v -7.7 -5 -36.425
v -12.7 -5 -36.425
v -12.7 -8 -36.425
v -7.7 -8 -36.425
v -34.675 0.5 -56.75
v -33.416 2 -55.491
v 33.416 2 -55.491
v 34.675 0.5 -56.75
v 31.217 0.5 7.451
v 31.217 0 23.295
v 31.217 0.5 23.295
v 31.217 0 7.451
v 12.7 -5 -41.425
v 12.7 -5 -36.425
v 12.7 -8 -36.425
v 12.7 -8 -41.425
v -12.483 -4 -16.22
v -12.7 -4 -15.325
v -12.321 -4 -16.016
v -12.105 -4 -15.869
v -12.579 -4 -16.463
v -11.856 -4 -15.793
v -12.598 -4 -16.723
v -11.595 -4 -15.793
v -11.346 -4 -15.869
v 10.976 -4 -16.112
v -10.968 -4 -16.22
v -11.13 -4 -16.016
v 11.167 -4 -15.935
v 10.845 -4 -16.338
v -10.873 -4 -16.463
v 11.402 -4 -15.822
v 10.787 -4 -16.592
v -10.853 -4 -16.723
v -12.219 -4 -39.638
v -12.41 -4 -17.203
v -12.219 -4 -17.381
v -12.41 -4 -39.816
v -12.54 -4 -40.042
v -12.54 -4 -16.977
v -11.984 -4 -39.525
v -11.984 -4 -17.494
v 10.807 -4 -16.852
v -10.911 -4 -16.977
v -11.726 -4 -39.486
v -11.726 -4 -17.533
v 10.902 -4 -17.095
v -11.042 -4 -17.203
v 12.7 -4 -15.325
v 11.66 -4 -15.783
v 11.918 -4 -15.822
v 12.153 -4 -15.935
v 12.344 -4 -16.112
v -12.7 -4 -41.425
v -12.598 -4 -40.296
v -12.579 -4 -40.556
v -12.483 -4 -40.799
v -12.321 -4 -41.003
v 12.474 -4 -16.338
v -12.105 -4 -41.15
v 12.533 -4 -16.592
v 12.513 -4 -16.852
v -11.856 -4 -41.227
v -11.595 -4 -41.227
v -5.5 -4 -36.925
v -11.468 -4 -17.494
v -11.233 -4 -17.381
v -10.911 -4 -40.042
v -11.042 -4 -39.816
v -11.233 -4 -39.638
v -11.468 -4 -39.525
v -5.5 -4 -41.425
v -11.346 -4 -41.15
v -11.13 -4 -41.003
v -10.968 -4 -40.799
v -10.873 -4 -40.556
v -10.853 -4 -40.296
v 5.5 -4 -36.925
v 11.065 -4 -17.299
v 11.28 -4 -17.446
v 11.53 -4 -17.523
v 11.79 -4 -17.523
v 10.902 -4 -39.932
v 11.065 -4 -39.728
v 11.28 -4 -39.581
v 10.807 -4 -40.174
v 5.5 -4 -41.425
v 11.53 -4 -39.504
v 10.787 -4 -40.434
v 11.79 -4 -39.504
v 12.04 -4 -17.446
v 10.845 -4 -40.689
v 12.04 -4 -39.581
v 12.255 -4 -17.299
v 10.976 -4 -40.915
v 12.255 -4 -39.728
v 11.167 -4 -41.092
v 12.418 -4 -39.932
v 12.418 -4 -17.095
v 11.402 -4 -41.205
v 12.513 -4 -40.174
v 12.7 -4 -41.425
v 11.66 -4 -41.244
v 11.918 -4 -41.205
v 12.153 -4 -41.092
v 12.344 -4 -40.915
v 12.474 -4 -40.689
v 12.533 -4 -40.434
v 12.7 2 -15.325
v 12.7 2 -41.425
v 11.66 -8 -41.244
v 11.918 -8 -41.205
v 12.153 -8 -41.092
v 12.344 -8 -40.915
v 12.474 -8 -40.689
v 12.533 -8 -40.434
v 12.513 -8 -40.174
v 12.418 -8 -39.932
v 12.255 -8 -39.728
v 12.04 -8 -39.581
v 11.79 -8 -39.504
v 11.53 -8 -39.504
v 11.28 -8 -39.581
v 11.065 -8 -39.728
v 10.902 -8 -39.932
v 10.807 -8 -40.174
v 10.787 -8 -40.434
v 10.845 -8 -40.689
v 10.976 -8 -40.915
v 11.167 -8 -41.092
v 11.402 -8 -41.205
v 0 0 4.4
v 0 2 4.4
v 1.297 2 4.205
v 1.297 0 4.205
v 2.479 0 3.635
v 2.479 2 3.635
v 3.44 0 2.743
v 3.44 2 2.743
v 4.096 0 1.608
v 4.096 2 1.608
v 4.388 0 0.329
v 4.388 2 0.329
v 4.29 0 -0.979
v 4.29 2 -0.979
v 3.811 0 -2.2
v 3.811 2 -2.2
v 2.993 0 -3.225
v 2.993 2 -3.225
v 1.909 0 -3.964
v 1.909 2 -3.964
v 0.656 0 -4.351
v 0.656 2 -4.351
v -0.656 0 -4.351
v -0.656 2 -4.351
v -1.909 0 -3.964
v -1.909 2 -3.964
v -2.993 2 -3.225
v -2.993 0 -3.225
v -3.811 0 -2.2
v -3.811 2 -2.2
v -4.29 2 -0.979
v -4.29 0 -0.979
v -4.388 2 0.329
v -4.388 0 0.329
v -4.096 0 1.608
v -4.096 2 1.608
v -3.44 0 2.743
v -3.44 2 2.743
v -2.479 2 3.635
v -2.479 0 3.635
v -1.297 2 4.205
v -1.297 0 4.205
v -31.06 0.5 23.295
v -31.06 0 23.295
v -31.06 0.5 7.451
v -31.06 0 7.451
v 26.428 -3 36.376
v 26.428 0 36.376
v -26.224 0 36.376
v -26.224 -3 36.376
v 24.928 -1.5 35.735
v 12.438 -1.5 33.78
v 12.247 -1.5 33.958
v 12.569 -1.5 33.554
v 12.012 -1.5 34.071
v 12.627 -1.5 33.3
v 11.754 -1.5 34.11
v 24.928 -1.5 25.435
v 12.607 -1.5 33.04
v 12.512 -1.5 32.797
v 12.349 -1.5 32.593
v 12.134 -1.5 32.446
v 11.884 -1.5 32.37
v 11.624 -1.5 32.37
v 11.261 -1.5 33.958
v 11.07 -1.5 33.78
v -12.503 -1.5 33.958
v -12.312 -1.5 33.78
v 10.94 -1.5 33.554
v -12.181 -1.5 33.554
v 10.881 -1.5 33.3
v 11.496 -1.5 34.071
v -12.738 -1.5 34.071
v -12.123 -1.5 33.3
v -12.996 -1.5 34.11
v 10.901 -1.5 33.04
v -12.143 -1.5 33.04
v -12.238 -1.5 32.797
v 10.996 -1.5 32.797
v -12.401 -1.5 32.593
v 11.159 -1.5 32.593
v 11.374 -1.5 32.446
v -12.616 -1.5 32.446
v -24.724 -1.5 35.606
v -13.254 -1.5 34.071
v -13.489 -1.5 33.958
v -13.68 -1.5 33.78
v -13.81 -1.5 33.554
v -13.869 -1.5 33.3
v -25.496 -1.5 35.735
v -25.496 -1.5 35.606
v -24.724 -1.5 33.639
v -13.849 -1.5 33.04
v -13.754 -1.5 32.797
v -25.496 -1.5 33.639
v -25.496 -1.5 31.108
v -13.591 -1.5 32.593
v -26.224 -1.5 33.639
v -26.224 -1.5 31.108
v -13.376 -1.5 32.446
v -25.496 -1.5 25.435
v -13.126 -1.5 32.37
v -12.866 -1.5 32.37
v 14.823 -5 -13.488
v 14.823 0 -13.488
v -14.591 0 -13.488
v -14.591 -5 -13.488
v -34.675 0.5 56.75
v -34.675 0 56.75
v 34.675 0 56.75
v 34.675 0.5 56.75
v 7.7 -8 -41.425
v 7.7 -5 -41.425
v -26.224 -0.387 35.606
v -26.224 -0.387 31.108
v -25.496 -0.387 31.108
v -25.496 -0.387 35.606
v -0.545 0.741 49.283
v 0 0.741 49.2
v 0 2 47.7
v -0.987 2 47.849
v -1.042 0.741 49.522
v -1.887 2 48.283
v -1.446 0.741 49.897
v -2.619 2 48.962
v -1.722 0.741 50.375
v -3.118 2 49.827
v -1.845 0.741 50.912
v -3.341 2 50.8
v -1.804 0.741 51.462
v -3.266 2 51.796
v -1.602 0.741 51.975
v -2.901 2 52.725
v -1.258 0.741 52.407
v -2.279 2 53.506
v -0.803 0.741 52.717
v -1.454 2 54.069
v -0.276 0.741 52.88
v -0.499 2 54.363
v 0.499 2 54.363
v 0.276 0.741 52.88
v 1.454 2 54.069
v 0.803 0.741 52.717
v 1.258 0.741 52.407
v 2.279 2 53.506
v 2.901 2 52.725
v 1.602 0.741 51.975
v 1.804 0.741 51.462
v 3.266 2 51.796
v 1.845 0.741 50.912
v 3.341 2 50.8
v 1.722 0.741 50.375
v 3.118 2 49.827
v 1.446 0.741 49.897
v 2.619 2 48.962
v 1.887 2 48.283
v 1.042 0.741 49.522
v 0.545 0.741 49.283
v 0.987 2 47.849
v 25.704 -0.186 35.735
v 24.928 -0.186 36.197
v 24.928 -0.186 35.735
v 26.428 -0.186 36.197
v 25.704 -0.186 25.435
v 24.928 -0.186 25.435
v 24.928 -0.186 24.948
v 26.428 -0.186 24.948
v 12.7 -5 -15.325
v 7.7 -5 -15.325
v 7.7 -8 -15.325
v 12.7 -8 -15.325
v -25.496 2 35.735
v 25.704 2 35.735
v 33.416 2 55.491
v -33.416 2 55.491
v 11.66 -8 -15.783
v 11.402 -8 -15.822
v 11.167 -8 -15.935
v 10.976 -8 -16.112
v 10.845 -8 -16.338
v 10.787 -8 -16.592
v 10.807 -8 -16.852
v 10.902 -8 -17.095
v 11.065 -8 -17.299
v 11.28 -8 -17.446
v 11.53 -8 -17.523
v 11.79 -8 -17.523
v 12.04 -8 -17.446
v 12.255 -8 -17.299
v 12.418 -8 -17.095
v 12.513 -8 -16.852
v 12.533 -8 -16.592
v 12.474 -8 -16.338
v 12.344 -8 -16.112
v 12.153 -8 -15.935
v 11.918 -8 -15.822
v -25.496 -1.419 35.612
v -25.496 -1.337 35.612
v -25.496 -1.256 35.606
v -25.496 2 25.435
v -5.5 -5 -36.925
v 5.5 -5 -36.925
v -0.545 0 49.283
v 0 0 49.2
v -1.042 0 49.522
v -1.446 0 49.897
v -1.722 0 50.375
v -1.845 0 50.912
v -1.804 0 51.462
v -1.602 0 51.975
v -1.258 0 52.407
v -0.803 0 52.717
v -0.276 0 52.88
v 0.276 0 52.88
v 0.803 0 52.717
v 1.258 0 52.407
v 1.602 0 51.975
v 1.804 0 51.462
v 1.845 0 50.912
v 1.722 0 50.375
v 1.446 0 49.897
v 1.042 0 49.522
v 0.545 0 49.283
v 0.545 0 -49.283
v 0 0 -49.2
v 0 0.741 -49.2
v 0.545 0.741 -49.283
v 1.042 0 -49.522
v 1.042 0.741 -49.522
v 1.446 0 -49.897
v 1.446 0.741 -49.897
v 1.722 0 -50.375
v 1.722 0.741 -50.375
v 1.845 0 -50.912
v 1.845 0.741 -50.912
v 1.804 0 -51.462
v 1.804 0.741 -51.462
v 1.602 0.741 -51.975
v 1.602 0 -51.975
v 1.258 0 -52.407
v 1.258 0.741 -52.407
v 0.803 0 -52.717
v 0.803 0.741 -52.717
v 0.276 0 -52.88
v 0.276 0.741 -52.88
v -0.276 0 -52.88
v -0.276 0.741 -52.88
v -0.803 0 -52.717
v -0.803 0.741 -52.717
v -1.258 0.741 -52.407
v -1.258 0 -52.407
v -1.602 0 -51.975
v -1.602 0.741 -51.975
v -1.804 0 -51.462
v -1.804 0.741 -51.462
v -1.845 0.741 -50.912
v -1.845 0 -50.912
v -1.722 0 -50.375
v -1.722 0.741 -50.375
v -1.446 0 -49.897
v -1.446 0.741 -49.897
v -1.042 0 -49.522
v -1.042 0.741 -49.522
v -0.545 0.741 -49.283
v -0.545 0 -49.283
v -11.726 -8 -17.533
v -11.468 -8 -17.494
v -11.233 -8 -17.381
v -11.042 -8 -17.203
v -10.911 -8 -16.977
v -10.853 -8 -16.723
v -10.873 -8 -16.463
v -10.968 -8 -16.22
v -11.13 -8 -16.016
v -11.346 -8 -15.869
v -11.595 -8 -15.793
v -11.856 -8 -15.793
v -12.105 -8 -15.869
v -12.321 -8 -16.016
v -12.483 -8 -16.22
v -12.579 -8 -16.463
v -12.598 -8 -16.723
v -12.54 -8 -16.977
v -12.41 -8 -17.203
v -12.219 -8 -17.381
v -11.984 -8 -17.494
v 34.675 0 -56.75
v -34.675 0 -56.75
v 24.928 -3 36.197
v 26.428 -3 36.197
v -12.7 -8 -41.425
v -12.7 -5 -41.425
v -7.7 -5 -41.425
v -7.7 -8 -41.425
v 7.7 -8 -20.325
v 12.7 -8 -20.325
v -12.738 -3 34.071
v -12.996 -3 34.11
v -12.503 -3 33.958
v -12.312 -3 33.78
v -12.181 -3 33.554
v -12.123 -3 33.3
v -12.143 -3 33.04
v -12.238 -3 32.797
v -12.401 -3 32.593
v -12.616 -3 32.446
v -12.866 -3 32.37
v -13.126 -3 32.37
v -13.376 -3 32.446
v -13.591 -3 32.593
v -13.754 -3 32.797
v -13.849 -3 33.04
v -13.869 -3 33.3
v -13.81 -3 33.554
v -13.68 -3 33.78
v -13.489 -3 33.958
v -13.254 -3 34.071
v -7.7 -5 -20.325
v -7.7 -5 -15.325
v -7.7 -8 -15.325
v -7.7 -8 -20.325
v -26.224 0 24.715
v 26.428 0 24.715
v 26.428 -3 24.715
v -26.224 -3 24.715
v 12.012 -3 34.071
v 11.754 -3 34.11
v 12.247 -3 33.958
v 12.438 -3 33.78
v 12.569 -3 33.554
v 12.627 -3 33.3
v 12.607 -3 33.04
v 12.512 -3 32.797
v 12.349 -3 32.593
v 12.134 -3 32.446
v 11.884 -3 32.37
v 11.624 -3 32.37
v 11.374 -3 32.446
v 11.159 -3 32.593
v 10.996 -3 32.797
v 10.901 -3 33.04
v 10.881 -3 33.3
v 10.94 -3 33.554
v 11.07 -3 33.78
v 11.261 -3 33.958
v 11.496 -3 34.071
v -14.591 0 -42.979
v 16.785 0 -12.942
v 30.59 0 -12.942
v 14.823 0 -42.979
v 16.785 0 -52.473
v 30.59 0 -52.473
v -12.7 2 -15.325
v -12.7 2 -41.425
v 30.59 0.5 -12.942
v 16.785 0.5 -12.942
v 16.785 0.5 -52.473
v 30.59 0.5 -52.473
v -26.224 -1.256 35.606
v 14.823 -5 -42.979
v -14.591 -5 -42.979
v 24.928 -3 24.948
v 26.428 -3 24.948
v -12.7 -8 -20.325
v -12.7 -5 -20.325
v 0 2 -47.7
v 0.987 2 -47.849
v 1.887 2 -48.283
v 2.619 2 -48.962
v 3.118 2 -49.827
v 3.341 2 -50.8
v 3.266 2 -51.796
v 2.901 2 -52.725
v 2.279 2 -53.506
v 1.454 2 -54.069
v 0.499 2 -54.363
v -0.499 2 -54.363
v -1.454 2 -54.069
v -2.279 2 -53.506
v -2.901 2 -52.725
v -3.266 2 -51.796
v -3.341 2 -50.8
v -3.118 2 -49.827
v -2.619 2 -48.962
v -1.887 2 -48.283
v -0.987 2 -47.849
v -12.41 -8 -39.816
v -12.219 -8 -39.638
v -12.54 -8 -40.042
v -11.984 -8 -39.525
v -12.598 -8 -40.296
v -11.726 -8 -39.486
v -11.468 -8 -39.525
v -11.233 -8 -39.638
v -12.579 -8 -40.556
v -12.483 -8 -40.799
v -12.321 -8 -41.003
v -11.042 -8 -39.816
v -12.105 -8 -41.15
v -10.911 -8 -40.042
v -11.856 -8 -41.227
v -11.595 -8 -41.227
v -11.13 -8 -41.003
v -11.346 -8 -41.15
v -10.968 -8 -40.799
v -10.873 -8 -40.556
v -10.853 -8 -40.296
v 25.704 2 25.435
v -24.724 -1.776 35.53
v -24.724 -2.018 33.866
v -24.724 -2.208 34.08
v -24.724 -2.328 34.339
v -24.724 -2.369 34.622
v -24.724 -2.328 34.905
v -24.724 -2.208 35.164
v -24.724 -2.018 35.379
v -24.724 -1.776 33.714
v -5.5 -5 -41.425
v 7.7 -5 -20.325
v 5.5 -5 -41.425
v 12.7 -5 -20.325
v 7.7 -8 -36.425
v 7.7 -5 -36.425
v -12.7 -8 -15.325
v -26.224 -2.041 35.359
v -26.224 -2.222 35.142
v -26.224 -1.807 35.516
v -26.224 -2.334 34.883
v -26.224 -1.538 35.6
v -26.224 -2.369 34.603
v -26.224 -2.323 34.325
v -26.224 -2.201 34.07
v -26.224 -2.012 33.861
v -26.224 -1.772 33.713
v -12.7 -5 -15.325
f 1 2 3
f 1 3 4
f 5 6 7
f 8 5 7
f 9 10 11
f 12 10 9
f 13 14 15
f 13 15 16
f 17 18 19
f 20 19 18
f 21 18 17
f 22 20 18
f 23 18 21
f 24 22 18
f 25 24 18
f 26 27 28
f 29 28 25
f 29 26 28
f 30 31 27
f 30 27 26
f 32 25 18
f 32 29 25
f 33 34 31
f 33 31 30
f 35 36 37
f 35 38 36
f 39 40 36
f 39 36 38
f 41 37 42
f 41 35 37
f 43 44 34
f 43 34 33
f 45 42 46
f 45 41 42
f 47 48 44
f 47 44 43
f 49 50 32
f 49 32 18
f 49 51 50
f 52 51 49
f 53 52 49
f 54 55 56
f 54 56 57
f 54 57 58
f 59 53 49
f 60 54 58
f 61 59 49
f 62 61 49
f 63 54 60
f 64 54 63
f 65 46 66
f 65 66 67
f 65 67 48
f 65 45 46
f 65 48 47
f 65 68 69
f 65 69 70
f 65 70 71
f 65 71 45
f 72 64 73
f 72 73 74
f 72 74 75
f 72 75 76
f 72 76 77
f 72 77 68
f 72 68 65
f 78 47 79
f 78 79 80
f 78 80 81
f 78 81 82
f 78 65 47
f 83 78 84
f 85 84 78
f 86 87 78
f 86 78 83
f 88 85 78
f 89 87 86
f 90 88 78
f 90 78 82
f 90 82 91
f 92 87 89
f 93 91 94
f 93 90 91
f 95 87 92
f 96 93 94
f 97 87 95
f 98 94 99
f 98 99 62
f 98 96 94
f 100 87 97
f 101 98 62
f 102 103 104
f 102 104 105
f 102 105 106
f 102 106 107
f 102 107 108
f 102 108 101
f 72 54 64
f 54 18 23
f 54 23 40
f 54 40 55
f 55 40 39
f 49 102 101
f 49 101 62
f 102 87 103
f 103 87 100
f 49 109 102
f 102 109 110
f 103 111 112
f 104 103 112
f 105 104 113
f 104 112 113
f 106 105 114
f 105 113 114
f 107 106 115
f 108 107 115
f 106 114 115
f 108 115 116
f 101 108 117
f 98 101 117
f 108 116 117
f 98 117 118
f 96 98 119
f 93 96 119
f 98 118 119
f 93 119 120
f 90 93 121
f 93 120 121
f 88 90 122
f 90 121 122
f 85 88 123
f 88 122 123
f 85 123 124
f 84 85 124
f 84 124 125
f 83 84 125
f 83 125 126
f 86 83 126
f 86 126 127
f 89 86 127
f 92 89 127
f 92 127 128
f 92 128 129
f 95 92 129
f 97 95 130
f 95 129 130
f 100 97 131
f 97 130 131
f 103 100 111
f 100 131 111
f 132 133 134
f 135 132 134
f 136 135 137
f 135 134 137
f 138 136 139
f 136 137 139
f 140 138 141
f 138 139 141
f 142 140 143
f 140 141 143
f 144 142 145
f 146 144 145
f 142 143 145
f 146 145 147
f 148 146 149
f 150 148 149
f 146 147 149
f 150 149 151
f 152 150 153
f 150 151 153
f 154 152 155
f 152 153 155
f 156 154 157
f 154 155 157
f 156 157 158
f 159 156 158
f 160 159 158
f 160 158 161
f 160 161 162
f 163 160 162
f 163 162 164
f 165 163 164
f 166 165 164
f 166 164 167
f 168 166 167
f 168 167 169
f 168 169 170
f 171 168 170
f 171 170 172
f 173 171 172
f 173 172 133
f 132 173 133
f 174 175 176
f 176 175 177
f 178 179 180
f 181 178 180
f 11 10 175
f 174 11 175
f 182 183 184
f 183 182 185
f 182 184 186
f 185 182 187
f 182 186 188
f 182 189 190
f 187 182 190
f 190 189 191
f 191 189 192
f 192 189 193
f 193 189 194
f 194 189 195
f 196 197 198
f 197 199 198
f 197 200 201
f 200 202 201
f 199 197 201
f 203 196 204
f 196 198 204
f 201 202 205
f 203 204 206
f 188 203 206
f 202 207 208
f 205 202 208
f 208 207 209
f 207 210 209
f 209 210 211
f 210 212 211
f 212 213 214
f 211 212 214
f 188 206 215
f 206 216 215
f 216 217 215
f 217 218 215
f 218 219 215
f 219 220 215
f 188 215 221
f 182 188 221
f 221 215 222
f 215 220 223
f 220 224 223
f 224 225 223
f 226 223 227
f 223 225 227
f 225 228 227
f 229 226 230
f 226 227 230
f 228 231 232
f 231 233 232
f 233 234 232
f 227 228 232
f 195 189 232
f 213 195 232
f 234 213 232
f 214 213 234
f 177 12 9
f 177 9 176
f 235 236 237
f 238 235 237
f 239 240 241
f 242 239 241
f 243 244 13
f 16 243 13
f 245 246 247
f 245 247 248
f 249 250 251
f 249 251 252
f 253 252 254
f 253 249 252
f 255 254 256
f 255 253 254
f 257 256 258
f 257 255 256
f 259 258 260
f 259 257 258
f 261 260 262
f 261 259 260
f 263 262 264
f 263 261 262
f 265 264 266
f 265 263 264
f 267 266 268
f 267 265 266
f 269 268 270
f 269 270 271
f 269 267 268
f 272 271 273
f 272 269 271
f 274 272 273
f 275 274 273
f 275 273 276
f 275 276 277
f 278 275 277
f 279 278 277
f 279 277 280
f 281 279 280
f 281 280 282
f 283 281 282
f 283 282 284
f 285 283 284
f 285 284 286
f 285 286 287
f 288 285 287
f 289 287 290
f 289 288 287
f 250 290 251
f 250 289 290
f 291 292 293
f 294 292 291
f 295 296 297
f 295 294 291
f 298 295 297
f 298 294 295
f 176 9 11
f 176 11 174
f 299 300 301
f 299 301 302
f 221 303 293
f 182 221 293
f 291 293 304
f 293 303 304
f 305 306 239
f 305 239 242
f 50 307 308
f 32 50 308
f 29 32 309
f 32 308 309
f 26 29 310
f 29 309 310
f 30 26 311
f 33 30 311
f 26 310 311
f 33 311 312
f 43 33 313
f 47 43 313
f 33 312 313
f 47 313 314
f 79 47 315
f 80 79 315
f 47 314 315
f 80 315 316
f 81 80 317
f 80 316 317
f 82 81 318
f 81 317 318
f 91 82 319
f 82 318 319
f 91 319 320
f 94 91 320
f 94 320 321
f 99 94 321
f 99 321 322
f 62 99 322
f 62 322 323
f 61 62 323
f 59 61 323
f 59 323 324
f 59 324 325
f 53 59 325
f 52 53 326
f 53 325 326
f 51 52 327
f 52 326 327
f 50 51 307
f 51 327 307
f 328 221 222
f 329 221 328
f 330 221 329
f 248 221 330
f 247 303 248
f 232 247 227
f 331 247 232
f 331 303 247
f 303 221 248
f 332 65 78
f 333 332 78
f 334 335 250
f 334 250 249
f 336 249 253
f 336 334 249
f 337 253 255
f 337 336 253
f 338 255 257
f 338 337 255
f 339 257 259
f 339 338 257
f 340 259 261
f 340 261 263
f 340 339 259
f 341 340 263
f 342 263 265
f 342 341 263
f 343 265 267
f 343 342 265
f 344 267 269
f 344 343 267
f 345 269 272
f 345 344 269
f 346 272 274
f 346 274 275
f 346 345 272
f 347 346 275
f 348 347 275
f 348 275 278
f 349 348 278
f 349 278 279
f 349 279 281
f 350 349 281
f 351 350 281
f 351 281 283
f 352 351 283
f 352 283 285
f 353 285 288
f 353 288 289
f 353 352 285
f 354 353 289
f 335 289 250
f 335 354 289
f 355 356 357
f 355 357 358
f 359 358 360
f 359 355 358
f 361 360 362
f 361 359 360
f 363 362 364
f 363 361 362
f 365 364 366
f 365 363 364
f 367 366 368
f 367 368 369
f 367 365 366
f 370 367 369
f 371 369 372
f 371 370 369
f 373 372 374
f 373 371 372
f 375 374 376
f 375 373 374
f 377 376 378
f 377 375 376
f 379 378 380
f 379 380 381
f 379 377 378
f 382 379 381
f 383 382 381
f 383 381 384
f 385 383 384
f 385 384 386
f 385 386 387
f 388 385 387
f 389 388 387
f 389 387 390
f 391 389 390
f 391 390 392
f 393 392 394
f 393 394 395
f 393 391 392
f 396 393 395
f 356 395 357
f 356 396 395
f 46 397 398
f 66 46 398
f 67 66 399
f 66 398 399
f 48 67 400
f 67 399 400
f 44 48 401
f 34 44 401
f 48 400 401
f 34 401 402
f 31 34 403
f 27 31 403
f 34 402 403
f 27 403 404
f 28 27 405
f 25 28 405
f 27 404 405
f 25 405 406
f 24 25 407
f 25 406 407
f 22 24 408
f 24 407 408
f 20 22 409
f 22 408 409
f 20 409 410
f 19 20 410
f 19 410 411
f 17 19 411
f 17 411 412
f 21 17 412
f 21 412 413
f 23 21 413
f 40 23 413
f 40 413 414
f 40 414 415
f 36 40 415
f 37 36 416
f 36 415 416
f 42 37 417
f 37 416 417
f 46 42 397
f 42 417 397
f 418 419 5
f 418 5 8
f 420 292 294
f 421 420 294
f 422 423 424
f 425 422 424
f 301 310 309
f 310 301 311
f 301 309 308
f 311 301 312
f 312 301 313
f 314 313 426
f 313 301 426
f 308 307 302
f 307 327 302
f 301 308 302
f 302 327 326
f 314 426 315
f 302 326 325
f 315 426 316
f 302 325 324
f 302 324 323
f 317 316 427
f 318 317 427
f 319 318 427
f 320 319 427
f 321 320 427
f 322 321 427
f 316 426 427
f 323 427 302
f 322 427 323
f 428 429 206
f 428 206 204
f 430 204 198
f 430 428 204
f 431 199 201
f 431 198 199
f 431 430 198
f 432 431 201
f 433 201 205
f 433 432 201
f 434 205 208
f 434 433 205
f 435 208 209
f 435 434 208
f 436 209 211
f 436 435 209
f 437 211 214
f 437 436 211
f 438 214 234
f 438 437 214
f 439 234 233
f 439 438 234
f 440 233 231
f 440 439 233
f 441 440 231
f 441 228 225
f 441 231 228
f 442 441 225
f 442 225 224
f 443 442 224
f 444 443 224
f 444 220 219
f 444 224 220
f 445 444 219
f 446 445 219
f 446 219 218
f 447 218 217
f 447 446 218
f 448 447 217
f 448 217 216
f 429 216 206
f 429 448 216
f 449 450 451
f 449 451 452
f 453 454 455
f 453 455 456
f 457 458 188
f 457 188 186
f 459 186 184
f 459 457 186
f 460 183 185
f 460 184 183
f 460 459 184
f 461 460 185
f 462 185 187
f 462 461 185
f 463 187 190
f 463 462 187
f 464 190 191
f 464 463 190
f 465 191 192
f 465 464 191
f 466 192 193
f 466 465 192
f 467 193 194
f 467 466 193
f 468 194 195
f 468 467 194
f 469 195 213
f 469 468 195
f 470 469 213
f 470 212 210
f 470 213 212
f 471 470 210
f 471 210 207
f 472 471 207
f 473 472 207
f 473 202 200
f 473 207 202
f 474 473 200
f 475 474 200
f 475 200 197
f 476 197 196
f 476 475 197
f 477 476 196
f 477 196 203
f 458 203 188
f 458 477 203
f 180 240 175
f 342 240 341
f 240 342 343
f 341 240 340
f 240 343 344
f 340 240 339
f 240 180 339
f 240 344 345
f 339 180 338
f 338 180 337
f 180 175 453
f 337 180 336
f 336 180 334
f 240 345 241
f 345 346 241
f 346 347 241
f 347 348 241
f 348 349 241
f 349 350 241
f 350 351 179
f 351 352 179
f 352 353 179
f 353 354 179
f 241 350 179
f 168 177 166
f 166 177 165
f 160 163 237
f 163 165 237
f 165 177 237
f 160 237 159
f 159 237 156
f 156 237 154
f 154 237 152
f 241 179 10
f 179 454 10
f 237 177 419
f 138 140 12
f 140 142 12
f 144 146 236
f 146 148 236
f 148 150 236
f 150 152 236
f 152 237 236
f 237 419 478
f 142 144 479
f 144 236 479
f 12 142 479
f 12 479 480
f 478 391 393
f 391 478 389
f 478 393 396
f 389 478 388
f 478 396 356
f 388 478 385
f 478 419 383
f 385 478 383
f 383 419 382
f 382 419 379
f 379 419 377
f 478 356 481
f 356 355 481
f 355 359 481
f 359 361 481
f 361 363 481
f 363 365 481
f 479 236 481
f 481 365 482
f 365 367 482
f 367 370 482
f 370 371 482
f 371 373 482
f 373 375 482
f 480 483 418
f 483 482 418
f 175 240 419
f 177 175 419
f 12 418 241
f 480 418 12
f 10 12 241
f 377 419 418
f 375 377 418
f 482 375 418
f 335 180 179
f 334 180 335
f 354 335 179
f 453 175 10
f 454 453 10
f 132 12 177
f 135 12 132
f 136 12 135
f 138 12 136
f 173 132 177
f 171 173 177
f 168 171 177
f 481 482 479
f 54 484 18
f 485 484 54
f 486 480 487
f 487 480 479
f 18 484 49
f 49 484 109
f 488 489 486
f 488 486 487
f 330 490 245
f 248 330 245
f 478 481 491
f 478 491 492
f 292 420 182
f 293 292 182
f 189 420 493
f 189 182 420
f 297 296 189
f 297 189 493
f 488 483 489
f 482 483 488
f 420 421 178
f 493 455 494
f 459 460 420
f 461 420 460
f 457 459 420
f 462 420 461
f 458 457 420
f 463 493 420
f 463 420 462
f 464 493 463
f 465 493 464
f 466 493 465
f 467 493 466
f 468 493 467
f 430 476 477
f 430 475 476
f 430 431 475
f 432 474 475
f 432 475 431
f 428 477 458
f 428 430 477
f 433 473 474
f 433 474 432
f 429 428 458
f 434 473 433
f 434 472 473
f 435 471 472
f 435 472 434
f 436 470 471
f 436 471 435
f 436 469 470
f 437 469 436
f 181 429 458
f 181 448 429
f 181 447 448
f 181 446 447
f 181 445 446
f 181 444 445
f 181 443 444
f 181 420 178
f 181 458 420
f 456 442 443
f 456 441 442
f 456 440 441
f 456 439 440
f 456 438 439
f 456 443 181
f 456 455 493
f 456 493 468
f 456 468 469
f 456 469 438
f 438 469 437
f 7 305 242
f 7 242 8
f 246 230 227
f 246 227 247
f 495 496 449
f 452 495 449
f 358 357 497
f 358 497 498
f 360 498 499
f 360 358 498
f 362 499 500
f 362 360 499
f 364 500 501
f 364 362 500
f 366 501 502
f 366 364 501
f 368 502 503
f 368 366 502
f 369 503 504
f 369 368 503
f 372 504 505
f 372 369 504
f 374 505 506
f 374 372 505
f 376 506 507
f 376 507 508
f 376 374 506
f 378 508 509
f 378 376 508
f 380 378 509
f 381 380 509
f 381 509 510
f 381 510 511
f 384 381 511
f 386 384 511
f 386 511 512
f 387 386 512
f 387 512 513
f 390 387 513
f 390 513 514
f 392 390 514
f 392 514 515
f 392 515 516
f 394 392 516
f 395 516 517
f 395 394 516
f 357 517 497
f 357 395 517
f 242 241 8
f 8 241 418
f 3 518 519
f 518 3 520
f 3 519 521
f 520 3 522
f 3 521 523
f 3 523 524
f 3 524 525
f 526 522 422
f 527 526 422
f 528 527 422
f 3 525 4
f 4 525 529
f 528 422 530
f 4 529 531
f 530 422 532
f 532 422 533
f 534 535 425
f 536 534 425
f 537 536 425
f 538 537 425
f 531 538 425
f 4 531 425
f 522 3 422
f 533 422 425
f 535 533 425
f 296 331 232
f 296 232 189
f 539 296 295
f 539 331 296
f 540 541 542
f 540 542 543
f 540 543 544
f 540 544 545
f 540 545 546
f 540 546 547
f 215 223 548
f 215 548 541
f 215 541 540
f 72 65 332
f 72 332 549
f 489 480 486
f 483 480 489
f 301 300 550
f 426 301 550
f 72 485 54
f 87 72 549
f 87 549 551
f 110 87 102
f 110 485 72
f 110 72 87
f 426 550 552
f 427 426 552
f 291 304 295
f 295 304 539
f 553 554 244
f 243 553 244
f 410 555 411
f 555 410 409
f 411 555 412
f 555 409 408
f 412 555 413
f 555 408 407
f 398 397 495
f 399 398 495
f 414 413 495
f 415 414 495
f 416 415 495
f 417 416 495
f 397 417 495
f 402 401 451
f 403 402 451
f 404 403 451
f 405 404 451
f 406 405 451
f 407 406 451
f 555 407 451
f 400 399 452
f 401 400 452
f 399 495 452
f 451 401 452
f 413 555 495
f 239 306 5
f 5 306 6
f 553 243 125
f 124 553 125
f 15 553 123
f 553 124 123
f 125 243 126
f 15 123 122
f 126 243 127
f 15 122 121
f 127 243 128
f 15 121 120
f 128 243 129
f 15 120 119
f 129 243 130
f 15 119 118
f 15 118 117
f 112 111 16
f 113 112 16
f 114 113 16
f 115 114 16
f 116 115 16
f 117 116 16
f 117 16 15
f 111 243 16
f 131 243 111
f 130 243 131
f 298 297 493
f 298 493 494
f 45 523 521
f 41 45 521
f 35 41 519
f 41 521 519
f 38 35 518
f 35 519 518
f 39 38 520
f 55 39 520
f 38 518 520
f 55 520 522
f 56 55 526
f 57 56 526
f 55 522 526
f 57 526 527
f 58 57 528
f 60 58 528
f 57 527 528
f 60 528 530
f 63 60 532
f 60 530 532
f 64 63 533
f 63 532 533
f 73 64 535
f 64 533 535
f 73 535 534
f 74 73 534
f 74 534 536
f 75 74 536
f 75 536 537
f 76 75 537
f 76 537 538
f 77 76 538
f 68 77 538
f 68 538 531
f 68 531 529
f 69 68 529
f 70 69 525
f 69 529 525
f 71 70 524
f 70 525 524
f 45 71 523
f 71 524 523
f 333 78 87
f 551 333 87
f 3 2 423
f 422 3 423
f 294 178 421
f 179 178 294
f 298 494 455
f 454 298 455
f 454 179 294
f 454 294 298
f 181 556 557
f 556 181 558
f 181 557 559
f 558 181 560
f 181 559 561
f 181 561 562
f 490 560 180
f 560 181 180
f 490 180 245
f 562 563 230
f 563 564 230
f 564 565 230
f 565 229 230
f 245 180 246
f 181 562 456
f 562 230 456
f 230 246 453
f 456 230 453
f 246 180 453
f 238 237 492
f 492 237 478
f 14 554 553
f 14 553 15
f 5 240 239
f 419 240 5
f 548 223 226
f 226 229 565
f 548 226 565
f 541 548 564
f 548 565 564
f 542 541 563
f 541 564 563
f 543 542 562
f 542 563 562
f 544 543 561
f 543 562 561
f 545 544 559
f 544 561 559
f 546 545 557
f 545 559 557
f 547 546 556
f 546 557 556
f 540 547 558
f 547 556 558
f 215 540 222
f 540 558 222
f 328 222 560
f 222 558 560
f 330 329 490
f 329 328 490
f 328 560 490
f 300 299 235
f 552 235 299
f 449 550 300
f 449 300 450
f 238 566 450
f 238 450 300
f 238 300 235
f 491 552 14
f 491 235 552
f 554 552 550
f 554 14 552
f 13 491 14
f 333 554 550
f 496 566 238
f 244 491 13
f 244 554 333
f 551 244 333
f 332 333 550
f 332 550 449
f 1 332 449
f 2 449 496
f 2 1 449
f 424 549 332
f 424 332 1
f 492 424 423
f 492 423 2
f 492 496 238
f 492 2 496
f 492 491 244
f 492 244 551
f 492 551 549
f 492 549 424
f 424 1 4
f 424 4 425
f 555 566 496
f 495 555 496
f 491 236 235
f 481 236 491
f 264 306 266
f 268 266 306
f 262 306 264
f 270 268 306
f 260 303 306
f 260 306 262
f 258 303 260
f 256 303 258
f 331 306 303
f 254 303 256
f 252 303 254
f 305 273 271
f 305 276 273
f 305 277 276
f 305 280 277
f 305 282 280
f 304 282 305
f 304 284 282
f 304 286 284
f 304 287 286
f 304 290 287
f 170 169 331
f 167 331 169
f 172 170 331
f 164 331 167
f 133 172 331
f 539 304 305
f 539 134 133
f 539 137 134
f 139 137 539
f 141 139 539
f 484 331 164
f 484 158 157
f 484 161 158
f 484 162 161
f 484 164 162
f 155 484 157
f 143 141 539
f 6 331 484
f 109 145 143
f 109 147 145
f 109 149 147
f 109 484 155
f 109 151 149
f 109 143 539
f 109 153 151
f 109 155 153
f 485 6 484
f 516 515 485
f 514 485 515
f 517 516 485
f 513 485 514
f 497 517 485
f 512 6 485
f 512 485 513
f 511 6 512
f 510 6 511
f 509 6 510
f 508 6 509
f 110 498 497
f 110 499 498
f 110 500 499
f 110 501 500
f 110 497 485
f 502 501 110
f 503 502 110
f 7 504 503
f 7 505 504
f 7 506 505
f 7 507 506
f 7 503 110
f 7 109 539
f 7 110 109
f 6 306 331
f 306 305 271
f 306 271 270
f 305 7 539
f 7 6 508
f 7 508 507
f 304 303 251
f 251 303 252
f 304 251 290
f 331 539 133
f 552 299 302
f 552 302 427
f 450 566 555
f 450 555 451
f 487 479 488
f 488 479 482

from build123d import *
from OCP.BRepFilletAPI import BRepFilletAPI_MakeChamfer

# Parameters (mm, degrees)
SKETCH2_W                = 69.35
SKETCH2_H                = 113.5
SKETCH2_R                = 1.85
BOSS_EXTRUDE3_DEPTH      = 2
SKETCH4_W                = 25.4
SKETCH4_H                = 26.1
CUT_EXTRUDE7_DEPTH       = 7.5
SKETCH16_W               = 29.414133621
SKETCH16_H               = 29.490350257
BOSS_EXTRUDE18_DEPTH     = 5
SKETCH17_W               = 25.4
SKETCH17_H               = 26.1
CUT_EXTRUDE8_DEPTH       = 4
SKETCH18_W               = 5
SKETCH18_H               = 5
BOSS_EXTRUDE24_DEPTH     = 4
SKETCH20_R               = 0.875
CUT_EXTRUDE10_DEPTH      = 4
SKETCH24_W               = 11
SKETCH24_H               = 4.5
CUT_EXTRUDE11_DEPTH      = 4
CHAMFER1_SIZE            = 1.5
CHAMFER1_SIZE2           = 1.258649447
SKETCH25_R               = 4.4
CUT_EXTRUDE12_DEPTH      = 4
SKETCH26_W               = 51.2
SKETCH26_H               = 10.3
CUT_EXTRUDE13_DEPTH      = 4
SKETCH27_W               = 52.651978828
SKETCH27_H               = 11.660574528
BOSS_EXTRUDE30_DEPTH     = 3
SKETCH30_W               = 51.2
SKETCH30_H               = 10.3
CUT_EXTRUDE14_DEPTH      = 3
SKETCH31_W               = 51.2
SKETCH31_H               = 10.3
BOSS_EXTRUDE31_DEPTH     = 1.5
SKETCH32_W               = 11.249454003
SKETCH32_H               = 2.603694337
CUT_EXTRUDE15_DEPTH      = 1.5
SKETCH33_W               = 1.5
SKETCH33_H               = 11.249454003
CUT_EXTRUDE16_DEPTH      = 1.5
SKETCH34_R               = 0.991075147
CUT_EXTRUDE17_DEPTH      = 1.5
SKETCH35_W               = 4.49763683
SKETCH35_H               = 1.113144729
CUT_EXTRUDE18_DEPTH      = 1.5
SKETCH36_W               = 62.277737466
SKETCH36_H               = 15.843958398
CUT_EXTRUDE19_DEPTH      = 0.5
SKETCH37_W               = 13.804637021
SKETCH37_H               = 39.531460558
CUT_EXTRUDE22_DEPTH      = 0.5
CHAMFER2_SIZE            = 1.5
CHAMFER2_SIZE2           = 1.258649447
CHAMFER3_SIZE            = 1.5
CHAMFER3_SIZE2           = 1.258649447
CUT_EXTRUDE23_DEPTH      = 67.821913509
CUT_EXTRUDE23_DEPTH_BACK = 67.821913509
SKETCH42_R               = 0.875


with BuildPart() as part:
    # Sketch2 → Boss-Extrude3 (new body)
    with BuildSketch(Plane(origin=(0, 0, 0), x_dir=(1, 0, 0), z_dir=(0, 1, 0))):
        Rectangle(SKETCH2_W, SKETCH2_H)
        with Locations(Location((0, 51.050462441, 0), (0, 0, 270))):
            Circle(SKETCH2_R, mode=Mode.SUBTRACT)
        with Locations(Location((0, -51.050462441, 0), (0, 0, 90))):
            Circle(SKETCH2_R, mode=Mode.SUBTRACT)
    extrude(amount=BOSS_EXTRUDE3_DEPTH)

    # Sketch4 → Cut-Extrude7 (cut)
    with BuildSketch(Plane(origin=(0, 2, 0), x_dir=(1, 0, 0), z_dir=(0, 1, 0))):
        with Locations((0, 28.375)):
            Rectangle(SKETCH4_W, SKETCH4_H)
    extrude(amount=-CUT_EXTRUDE7_DEPTH, mode=Mode.SUBTRACT)

    # Sketch16 → Boss-Extrude18 (add)
    with BuildSketch(Plane(origin=(0, 0, 0), x_dir=(-1, 0, 0), z_dir=(0, -1, 0))):
        with Locations((-0.116069165, 28.233366211)):
            Rectangle(SKETCH16_W, SKETCH16_H)
    extrude(amount=BOSS_EXTRUDE18_DEPTH)

    # Sketch17 → Cut-Extrude8 (cut)
    with BuildSketch(Plane(origin=(0, 0, 0), x_dir=(1, 0, 0), z_dir=(0, 1, 0))):
        with Locations((0, 28.375)):
            Rectangle(SKETCH17_W, SKETCH17_H)
    extrude(amount=-CUT_EXTRUDE8_DEPTH, mode=Mode.SUBTRACT)

    # Sketch18 → Boss-Extrude24 (add)
    with BuildSketch(Plane(origin=(0, -4, 0), x_dir=(1, 0, 0), z_dir=(0, 1, 0))):
        with Locations((-10.2, 38.925)):
            Rectangle(SKETCH18_W, SKETCH18_H)
        with Locations((10.2, 38.925)):
            Rectangle(SKETCH18_W, SKETCH18_H)
        with Locations((10.2, 17.825)):
            Rectangle(SKETCH18_W, SKETCH18_H)
        with Locations((-10.2, 17.825)):
            Rectangle(SKETCH18_W, SKETCH18_H)
    extrude(amount=-BOSS_EXTRUDE24_DEPTH)

    # Sketch20 → Cut-Extrude10 (cut)
    with BuildSketch(Plane(origin=(0, -8, 0), x_dir=(-1, 0, 0), z_dir=(0, -1, 0))):
        with Locations(Location((-11.659970213, 40.369100554, 0), (0, 0, 90))):
            Circle(SKETCH20_R)
        with Locations(Location((11.725608978, 40.361432855, 0), (0, 0, 270))):
            Circle(SKETCH20_R)
        with Locations(Location((11.725608978, 16.657728735, 0), (0, 0, 90))):
            Circle(SKETCH20_R)
        with Locations(Location((-11.659970213, 16.657728735, 0), (0, 0, 270))):
            Circle(SKETCH20_R)
    extrude(amount=-CUT_EXTRUDE10_DEPTH, mode=Mode.SUBTRACT)

    # Sketch24 → Cut-Extrude11 (cut)
    with BuildSketch(Plane(origin=(0, -4, 0), x_dir=(1, 0, 0), z_dir=(0, 1, 0))):
        with Locations((0, 39.175)):
            Rectangle(SKETCH24_W, SKETCH24_H)
    extrude(amount=-CUT_EXTRUDE11_DEPTH, mode=Mode.SUBTRACT)

    # Chamfer1: one chamfer whose edges measure the first distance from different faces: ONE call of the kernel's chamfer builder (chamfer() names one face for all edges)
    chamfer1_edges_1 = [part.edges().sort_by_distance(p)[0] for p in [
        (-34.675, 2, 0),
    ]]
    chamfer1_side_1 = [part.faces().sort_by_distance(p)[0] for p in [
        (-34.675, 1, 0),
    ]]
    chamfer1_edges_2 = [part.edges().sort_by_distance(p)[0] for p in [
        (0, 2, 56.75),
    ]]
    chamfer1_side_2 = [part.faces().sort_by_distance(p)[0] for p in [
        (0, 1, 56.75),
    ]]
    chamfer1_edges_3 = [part.edges().sort_by_distance(p)[0] for p in [
        (34.675, 2, 0),
    ]]
    chamfer1_side_3 = [part.faces().sort_by_distance(p)[0] for p in [
        (34.675, 1, 0),
    ]]
    chamfer1_edges_4 = [part.edges().sort_by_distance(p)[0] for p in [
        (0, 2, -56.75),
    ]]
    chamfer1_side_4 = [part.faces().sort_by_distance(p)[0] for p in [
        (0, 1, -56.75),
    ]]
    chamfer1 = BRepFilletAPI_MakeChamfer(part.part.solid().wrapped)
    for e in chamfer1_edges_1:
        chamfer1.Add(CHAMFER1_SIZE, CHAMFER1_SIZE2, e.wrapped, chamfer1_side_1[0].wrapped)  # the first distance lies on this face
    for e in chamfer1_edges_2:
        chamfer1.Add(CHAMFER1_SIZE, CHAMFER1_SIZE2, e.wrapped, chamfer1_side_2[0].wrapped)  # the first distance lies on this face
    for e in chamfer1_edges_3:
        chamfer1.Add(CHAMFER1_SIZE, CHAMFER1_SIZE2, e.wrapped, chamfer1_side_3[0].wrapped)  # the first distance lies on this face
    for e in chamfer1_edges_4:
        chamfer1.Add(CHAMFER1_SIZE, CHAMFER1_SIZE2, e.wrapped, chamfer1_side_4[0].wrapped)  # the first distance lies on this face
    add(Compound.cast(chamfer1.Shape()), mode=Mode.REPLACE)

    # Sketch25 → Cut-Extrude12 (cut)
    with BuildSketch(Plane(origin=(0, 2, 0), x_dir=(1, 0, 0), z_dir=(0, 1, 0))):
        with Locations(Location((0, 0, 0), (0, 0, 270))):
            Circle(SKETCH25_R)
    extrude(amount=-CUT_EXTRUDE12_DEPTH, mode=Mode.SUBTRACT)

    # Sketch26 → Cut-Extrude13 (cut)
    with BuildSketch(Plane(origin=(0, 2, 0), x_dir=(1, 0, 0), z_dir=(0, 1, 0))):
        with Locations((0.104035738, -30.584770495)):
            Rectangle(SKETCH26_W, SKETCH26_H)
    extrude(amount=-CUT_EXTRUDE13_DEPTH, mode=Mode.SUBTRACT)

    # Sketch27 → Boss-Extrude30 (add)
    with BuildSketch(Plane(origin=(0, 0, 0), x_dir=(-1, 0, 0), z_dir=(0, -1, 0))):
        with Locations((-0.102132054, -30.545281087)):
            Rectangle(SKETCH27_W, SKETCH27_H)
    extrude(amount=BOSS_EXTRUDE30_DEPTH)

    # Sketch30 → Cut-Extrude14 (cut)
    with BuildSketch(Plane(origin=(0, 0, 0), x_dir=(1, 0, 0), z_dir=(0, 1, 0))):
        with Locations((0.104035738, -30.584770495)):
            Rectangle(SKETCH30_W, SKETCH30_H)
    extrude(amount=-CUT_EXTRUDE14_DEPTH, mode=Mode.SUBTRACT)

    # Sketch31 → Boss-Extrude31 (add)
    with BuildSketch(Plane(origin=(0, -3, 0), x_dir=(-1, 0, 0), z_dir=(0, -1, 0))):
        with Locations((-0.104035738, -30.584770495)):
            Rectangle(SKETCH31_W, SKETCH31_H)
    extrude(amount=-BOSS_EXTRUDE31_DEPTH)

    # Sketch32 → Cut-Extrude15 (cut)
    with BuildSketch(Plane(origin=(26.428121468, 0, 0), x_dir=(0, 0, -1), z_dir=(1, 0, 0))):
        with Locations((-30.572653553, -1.487745374)):
            Rectangle(SKETCH32_W, SKETCH32_H)
    extrude(amount=-CUT_EXTRUDE15_DEPTH, mode=Mode.SUBTRACT)

    # Sketch33 → Cut-Extrude16 (cut)
    with BuildSketch(Plane(origin=(0, -2.789592542, 0), x_dir=(1, 0, 0), z_dir=(0, 1, 0))):
        with Locations((25.678121468, -30.572653553)):
            Rectangle(SKETCH33_W, SKETCH33_H)
    extrude(amount=-CUT_EXTRUDE16_DEPTH, mode=Mode.SUBTRACT)

    # Sketch34 → Cut-Extrude17 (cut)
    with BuildSketch(Plane.ZY.offset(26.22385736)):
        with Locations((34.622232322, -1.377930419)):
            Circle(SKETCH34_R)
    extrude(amount=-CUT_EXTRUDE17_DEPTH, mode=Mode.SUBTRACT)

    # Sketch35 → Cut-Extrude18 (cut)
    with BuildSketch(Plane.ZY.offset(26.22385736)):
        with Locations((33.35694274, -0.943427635)):
            Rectangle(SKETCH35_W, SKETCH35_H)
    extrude(amount=-CUT_EXTRUDE18_DEPTH, mode=Mode.SUBTRACT)

    # Sketch36 → Cut-Extrude19 (cut)
    with BuildSketch(Plane(origin=(0, 0, 0), x_dir=(-1, 0, 0), z_dir=(0, -1, 0))):
        with Locations((-0.078435438, -15.373345772)):
            Rectangle(SKETCH36_W, SKETCH36_H)
    extrude(amount=-CUT_EXTRUDE19_DEPTH, mode=Mode.SUBTRACT)

    # Sketch37 → Cut-Extrude22 (cut)
    with BuildSketch(Plane(origin=(0, 0, 0), x_dir=(-1, 0, 0), z_dir=(0, -1, 0))):
        with Locations((-23.687502159, 32.707577485)):
            Rectangle(SKETCH37_W, SKETCH37_H)
    extrude(amount=-CUT_EXTRUDE22_DEPTH, mode=Mode.SUBTRACT)

    # Chamfer2
    chamfer2_edges = [part.edges().sort_by_distance(p)[0] for p in [
        (0, 2, 52.900462441),
    ]]
    chamfer2_side = [part.faces().sort_by_distance(p)[0] for p in [
        (-32.120828655, 2, 0),
    ]]
    chamfer(chamfer2_edges, length=CHAMFER2_SIZE, length2=CHAMFER2_SIZE2, reference=chamfer2_side[0])

    # Chamfer3
    chamfer3_edges = [part.edges().sort_by_distance(p)[0] for p in [
        (0, 2, -52.900462441),
    ]]
    chamfer3_side = [part.faces().sort_by_distance(p)[0] for p in [
        (0, 2, 54.53001463),
    ]]
    chamfer(chamfer3_edges, length=CHAMFER3_SIZE, length2=CHAMFER3_SIZE2, reference=chamfer3_side[0])

    # Sketch42 → Cut-Extrude23 (cut, two sides: drawn at the far end of the back side and taken through both)
    with BuildSketch(Plane(origin=(0, -1.5, 0), x_dir=(1, 0, 0), z_dir=(0, 1, 0)).offset(-CUT_EXTRUDE23_DEPTH_BACK)):
        with Locations(Location((-12.995964262, -33.234770495, 0), (0, 0, 270))):
            Circle(SKETCH42_R)
        with Locations(Location((11.754035738, -33.234770495, 0), (0, 0, 270))):
            Circle(SKETCH42_R)
    extrude(amount=CUT_EXTRUDE23_DEPTH + CUT_EXTRUDE23_DEPTH_BACK, mode=Mode.SUBTRACT)


solid = part.part
